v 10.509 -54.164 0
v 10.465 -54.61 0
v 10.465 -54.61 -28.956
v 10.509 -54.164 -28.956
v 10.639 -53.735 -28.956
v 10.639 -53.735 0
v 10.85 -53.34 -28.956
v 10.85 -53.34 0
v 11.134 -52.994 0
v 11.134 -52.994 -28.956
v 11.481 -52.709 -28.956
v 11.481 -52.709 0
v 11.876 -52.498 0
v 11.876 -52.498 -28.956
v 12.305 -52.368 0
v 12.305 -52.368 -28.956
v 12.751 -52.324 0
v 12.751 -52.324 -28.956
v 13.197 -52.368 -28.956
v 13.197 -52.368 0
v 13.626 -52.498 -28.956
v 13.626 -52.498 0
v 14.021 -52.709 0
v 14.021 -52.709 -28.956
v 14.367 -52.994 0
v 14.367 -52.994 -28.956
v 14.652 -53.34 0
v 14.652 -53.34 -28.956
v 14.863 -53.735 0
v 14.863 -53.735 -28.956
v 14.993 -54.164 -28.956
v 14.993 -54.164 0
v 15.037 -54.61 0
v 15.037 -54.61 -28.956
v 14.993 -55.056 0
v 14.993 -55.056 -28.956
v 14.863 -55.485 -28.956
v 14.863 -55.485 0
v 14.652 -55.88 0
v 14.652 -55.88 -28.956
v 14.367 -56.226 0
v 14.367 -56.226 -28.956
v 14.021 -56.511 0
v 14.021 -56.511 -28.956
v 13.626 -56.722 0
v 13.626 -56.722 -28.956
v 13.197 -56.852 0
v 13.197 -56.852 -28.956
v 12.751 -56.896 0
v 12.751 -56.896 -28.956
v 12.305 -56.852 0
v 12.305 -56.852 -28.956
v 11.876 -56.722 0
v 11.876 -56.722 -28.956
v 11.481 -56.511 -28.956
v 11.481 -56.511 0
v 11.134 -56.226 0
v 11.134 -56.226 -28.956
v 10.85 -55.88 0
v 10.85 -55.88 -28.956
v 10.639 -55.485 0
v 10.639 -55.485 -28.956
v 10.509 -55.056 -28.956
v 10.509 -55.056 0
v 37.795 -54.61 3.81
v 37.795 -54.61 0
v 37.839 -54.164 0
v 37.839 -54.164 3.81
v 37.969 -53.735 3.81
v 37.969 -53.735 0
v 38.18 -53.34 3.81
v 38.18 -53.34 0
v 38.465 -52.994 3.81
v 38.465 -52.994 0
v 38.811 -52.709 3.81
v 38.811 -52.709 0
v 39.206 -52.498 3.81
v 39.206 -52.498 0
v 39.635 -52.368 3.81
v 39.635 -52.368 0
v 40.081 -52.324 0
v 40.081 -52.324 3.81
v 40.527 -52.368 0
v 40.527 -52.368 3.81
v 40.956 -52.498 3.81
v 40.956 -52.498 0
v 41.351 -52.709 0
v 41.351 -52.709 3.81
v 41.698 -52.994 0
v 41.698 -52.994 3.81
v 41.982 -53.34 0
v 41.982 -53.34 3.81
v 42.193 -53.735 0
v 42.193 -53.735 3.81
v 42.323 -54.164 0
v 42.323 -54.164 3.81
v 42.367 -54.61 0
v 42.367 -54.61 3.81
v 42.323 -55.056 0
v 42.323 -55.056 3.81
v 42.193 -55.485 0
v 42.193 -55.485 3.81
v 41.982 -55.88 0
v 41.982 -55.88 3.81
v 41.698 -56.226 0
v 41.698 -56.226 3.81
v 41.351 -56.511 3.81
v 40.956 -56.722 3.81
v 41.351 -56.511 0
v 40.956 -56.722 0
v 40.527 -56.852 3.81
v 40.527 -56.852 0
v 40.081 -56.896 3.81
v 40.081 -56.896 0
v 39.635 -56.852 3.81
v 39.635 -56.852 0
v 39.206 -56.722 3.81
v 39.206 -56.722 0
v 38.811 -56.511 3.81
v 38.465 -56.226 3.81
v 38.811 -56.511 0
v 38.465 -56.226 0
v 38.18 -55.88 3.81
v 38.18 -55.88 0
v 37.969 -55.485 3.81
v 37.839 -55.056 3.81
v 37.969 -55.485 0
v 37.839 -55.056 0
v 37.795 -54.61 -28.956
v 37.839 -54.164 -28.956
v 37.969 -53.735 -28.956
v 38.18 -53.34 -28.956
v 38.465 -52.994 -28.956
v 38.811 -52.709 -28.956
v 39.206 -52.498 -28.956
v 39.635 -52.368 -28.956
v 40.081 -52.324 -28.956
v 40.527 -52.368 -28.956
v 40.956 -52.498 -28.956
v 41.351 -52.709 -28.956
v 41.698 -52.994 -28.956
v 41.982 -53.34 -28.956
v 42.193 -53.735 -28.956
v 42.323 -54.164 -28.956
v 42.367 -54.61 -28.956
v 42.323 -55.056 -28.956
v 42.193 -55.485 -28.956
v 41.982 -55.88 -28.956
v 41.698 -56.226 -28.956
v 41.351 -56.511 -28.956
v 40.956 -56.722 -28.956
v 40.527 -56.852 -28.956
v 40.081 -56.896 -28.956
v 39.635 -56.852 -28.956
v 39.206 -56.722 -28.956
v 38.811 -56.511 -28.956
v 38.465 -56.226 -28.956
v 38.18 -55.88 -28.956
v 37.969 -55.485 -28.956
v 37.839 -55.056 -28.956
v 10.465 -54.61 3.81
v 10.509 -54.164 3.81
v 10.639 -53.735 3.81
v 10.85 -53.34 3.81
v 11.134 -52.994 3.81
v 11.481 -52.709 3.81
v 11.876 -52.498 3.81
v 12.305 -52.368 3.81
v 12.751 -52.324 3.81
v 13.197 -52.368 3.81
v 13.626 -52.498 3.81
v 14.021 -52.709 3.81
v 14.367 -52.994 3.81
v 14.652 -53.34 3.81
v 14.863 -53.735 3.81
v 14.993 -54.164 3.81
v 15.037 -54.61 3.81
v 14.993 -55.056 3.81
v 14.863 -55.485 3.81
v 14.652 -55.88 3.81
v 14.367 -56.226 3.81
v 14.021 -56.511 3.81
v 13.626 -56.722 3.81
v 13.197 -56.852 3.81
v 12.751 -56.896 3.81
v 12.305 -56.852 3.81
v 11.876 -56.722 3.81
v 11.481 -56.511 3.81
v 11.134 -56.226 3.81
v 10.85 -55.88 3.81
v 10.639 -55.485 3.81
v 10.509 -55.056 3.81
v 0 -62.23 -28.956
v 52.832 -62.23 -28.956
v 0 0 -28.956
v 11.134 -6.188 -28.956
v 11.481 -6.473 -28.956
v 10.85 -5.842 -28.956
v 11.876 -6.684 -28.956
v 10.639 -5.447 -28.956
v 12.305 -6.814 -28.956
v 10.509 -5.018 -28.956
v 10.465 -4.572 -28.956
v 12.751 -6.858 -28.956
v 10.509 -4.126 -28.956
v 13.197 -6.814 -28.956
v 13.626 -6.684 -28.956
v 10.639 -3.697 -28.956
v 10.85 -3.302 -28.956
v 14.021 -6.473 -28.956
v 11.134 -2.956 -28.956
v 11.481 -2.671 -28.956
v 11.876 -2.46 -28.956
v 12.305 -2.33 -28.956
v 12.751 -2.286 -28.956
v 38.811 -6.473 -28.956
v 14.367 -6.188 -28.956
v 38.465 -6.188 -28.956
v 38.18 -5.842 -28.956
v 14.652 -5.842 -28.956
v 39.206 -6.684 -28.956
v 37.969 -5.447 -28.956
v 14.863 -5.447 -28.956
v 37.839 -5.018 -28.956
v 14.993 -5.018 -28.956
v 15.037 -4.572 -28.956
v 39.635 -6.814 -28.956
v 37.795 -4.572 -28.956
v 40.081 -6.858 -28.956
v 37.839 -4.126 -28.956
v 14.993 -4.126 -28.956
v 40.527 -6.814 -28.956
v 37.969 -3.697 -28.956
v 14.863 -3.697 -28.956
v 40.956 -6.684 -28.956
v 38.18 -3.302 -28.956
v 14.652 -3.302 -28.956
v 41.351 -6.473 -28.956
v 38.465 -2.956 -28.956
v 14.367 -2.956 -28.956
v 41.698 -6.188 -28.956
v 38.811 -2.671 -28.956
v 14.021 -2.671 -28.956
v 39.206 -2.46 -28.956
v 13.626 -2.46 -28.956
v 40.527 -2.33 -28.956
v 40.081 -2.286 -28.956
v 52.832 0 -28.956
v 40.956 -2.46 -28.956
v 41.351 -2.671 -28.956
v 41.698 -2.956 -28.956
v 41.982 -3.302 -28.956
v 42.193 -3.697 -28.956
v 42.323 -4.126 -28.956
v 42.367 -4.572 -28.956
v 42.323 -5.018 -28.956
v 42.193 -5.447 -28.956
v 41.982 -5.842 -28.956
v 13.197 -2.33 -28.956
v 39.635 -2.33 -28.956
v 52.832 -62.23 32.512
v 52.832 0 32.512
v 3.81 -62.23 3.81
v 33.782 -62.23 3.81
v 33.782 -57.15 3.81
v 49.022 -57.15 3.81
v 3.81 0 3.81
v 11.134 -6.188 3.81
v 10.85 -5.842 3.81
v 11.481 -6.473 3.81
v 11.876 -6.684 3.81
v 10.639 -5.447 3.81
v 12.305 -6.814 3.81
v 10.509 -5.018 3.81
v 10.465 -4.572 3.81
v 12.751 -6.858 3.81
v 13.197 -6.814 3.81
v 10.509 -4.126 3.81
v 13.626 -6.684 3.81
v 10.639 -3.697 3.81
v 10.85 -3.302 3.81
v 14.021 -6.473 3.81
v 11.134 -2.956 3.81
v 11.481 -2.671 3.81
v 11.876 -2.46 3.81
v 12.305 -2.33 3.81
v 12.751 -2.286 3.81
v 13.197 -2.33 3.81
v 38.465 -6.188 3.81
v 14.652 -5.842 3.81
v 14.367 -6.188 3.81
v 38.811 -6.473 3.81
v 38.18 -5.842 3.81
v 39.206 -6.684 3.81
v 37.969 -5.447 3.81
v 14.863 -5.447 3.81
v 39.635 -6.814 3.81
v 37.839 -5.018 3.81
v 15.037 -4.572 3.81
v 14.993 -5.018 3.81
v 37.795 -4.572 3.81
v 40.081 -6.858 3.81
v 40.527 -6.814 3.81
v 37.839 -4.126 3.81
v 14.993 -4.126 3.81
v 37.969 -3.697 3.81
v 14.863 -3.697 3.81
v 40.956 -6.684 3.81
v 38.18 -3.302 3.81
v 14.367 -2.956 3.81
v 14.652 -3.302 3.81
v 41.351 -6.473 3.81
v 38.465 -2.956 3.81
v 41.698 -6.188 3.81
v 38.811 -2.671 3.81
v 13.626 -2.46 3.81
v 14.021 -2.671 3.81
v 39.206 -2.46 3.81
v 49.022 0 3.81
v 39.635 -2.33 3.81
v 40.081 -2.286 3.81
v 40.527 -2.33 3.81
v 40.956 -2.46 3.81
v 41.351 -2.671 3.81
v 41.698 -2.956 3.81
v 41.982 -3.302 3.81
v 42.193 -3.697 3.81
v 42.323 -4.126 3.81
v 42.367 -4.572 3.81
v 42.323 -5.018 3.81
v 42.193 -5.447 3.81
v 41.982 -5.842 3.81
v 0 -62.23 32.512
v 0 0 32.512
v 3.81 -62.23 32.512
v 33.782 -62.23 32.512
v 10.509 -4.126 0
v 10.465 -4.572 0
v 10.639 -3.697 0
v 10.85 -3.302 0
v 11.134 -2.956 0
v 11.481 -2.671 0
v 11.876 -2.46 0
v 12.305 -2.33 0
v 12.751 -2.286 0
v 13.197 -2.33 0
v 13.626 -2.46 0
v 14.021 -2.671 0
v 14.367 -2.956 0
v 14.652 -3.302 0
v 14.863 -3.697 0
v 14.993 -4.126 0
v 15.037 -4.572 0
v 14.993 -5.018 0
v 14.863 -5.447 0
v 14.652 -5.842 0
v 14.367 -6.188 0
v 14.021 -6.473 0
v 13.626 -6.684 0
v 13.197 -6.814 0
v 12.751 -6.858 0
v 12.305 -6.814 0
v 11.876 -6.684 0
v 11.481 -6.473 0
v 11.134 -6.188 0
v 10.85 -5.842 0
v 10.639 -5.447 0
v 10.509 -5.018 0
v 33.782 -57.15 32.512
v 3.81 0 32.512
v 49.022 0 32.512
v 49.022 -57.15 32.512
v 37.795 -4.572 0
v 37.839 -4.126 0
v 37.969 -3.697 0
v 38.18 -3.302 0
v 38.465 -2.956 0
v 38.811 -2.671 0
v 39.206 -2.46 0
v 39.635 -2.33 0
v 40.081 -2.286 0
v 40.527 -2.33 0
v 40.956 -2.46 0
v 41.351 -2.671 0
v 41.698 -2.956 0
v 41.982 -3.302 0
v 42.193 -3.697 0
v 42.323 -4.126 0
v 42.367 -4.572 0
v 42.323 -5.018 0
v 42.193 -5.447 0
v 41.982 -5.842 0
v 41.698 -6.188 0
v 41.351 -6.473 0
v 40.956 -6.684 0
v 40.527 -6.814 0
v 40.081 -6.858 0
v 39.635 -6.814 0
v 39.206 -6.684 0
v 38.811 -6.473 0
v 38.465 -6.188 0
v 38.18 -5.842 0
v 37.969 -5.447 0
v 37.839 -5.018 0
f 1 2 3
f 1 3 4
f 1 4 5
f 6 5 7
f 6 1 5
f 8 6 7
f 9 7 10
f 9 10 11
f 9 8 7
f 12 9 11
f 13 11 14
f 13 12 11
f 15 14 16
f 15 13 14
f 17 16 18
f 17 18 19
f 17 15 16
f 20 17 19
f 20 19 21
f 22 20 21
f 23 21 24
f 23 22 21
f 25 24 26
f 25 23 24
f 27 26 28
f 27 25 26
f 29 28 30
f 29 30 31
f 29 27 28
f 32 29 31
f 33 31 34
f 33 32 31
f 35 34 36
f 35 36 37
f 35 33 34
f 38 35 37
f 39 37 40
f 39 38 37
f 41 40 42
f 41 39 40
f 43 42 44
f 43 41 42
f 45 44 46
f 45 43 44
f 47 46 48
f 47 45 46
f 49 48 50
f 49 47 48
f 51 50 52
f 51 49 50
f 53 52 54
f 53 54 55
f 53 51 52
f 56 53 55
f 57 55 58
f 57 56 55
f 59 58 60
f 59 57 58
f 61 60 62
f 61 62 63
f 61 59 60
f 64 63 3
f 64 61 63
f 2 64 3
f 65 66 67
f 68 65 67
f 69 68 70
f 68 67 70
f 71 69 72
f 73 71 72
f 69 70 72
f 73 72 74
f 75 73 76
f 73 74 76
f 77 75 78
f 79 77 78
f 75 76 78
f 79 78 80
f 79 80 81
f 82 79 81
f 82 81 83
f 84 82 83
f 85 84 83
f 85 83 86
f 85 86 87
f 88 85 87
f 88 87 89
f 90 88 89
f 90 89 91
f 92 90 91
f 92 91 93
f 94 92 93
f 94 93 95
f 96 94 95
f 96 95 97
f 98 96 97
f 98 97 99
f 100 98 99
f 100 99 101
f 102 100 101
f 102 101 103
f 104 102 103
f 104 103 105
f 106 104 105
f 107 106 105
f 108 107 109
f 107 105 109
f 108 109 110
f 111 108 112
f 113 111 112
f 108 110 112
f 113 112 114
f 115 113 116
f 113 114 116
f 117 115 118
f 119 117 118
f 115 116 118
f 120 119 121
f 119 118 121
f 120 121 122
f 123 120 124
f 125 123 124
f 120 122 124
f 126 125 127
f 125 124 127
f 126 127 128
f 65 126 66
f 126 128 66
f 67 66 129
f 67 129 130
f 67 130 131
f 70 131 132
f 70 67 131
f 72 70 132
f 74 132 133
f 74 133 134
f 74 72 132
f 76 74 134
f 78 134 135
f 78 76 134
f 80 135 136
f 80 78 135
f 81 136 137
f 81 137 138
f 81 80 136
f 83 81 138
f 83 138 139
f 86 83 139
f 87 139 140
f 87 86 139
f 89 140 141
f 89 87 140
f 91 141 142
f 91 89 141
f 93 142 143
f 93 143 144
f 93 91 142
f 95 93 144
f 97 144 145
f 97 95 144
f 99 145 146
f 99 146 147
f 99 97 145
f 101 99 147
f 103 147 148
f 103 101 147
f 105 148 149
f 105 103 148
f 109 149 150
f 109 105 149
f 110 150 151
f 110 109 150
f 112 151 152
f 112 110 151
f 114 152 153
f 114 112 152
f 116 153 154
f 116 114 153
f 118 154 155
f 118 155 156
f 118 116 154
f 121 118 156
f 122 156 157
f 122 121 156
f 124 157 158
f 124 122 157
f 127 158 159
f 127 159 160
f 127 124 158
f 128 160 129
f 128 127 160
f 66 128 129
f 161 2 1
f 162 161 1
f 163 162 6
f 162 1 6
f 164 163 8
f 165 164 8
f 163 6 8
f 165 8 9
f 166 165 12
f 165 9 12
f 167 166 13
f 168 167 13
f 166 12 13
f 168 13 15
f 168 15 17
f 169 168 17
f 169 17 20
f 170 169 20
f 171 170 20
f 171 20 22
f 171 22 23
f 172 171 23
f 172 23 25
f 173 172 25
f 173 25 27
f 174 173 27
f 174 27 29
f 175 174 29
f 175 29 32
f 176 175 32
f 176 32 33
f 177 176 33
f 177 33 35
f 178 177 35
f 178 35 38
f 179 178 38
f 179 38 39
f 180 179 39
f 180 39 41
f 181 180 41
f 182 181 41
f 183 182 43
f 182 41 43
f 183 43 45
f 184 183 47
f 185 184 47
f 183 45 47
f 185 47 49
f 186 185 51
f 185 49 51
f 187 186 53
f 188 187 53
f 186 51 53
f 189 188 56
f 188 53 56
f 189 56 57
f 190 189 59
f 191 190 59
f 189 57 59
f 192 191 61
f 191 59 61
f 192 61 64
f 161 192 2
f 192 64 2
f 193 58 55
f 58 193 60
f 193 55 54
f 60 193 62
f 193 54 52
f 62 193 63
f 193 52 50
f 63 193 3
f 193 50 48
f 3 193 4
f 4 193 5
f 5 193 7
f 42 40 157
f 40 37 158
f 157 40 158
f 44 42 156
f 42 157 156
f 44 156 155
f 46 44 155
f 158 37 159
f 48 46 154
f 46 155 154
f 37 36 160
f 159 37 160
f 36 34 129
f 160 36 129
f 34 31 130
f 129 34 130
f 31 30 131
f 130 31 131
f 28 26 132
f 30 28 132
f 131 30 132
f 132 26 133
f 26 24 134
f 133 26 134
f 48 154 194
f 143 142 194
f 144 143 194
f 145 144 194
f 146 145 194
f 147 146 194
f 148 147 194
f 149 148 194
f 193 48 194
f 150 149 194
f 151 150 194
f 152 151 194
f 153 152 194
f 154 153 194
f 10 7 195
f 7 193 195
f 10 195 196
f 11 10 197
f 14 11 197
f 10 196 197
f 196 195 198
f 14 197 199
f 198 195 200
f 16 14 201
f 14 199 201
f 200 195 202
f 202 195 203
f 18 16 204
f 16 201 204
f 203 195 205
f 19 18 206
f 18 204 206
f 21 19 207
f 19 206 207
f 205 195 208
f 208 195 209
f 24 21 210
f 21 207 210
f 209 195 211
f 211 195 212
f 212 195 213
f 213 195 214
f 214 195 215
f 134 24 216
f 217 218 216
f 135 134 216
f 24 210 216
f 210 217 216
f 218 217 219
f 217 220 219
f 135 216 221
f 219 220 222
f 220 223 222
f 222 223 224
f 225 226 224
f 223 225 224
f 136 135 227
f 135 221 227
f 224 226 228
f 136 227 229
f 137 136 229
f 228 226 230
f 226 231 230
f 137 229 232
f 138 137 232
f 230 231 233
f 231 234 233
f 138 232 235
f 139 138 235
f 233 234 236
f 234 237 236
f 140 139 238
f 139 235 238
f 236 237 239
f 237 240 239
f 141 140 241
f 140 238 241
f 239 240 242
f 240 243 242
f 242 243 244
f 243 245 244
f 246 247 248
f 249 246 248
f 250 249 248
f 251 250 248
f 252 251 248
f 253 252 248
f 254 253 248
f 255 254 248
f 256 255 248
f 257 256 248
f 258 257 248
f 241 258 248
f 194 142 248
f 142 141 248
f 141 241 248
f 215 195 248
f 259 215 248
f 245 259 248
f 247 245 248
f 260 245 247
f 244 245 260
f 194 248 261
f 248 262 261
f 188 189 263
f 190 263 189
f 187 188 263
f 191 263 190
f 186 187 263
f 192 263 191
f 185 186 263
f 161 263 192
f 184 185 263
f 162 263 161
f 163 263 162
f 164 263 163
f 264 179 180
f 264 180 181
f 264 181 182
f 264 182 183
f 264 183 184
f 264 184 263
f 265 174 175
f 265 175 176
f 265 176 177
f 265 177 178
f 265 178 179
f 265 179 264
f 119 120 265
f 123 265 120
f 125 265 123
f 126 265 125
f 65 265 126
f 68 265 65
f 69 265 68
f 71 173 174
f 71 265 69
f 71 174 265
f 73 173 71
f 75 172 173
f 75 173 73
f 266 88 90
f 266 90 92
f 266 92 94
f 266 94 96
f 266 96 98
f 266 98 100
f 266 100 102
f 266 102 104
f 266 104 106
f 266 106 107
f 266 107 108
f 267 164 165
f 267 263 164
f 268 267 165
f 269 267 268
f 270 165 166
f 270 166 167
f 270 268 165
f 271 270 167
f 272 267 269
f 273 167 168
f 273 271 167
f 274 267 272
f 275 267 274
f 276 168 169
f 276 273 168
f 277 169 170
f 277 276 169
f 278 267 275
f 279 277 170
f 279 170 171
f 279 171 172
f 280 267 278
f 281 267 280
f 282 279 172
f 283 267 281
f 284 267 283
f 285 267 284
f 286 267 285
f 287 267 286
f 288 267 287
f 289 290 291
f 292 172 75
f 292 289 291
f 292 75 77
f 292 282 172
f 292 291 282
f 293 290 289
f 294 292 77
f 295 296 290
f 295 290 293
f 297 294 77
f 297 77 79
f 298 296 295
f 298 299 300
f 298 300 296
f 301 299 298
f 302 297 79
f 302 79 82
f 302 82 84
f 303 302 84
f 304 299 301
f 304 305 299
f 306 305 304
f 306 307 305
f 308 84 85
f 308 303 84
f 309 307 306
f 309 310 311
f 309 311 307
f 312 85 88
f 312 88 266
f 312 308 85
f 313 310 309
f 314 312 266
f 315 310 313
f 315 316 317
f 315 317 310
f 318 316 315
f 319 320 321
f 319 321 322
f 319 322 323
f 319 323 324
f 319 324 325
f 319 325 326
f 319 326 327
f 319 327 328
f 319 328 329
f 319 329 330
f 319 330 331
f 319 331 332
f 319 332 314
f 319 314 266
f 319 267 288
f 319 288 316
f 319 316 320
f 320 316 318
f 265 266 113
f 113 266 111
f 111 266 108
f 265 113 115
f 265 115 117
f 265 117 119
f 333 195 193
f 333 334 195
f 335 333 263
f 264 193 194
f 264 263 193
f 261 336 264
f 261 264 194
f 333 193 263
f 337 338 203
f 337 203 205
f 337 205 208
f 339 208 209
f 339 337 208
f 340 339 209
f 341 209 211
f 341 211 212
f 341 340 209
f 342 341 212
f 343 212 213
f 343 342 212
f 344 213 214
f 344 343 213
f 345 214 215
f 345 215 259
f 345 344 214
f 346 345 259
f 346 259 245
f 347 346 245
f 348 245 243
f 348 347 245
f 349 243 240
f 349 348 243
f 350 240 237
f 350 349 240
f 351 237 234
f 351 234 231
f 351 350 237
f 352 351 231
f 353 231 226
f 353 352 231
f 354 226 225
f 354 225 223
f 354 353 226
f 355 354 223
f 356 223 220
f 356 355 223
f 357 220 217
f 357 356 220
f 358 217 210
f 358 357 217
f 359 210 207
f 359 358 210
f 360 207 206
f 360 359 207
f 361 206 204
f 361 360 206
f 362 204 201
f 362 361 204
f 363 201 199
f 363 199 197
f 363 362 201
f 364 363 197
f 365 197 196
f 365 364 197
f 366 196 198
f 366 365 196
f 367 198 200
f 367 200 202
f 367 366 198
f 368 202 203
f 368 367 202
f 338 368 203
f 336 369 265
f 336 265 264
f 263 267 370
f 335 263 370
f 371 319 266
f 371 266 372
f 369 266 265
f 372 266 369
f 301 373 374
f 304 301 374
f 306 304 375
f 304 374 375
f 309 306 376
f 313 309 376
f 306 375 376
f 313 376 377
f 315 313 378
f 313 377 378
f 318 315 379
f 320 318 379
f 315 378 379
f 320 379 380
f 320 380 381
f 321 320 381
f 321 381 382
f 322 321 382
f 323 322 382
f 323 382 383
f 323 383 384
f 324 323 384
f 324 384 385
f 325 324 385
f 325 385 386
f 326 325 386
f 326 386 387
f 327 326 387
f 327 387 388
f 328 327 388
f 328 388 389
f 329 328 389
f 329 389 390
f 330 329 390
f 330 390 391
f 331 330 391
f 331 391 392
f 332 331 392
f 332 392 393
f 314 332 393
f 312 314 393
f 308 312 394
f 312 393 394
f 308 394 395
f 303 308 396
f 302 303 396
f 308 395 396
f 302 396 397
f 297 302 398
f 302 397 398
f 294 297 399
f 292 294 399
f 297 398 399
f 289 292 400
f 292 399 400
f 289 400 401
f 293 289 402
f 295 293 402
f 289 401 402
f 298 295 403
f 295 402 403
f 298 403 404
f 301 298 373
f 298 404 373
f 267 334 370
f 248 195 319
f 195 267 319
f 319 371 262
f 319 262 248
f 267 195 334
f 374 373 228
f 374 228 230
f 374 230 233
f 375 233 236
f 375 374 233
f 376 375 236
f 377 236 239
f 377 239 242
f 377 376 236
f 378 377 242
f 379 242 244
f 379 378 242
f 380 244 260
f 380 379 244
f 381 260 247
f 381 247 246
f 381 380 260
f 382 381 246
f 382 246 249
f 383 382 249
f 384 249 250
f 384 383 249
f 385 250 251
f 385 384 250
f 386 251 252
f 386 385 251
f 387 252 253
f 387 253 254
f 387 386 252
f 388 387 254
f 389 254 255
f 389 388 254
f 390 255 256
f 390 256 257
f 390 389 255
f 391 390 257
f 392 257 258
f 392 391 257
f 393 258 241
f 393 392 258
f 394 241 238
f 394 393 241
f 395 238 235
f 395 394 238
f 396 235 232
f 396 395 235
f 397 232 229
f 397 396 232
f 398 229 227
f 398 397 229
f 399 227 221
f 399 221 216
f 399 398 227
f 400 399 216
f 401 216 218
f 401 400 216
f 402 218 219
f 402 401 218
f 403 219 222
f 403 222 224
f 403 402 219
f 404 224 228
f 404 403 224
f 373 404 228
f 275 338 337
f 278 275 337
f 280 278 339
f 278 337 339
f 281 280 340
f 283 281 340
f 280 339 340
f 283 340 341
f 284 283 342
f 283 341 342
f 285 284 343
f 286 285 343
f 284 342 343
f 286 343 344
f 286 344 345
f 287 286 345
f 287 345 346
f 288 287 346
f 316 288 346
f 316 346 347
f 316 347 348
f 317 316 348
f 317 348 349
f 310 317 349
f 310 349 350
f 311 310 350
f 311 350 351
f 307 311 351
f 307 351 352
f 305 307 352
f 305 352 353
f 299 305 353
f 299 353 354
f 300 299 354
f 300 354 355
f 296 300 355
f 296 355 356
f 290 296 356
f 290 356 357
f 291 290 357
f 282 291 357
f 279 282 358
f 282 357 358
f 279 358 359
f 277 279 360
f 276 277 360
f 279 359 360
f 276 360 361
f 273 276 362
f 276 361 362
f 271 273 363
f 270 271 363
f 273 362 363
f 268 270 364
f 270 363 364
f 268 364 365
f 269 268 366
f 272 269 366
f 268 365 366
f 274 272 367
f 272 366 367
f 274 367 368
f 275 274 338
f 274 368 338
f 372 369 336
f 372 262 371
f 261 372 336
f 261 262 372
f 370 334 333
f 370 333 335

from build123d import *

# Parameters (mm, degrees)
F0_W     = 52.832
F0_H     = 32.512
F1_DEPTH = 62.23
F2_T     = -3.81
F3_W     = 5.08
F3_H     = 28.702
F4_DEPTH = 15.24
F6_D     = 4.572
F7_DEPTH = 28.956


with BuildPart() as f1:
    # F0 (on Front) → F1 (new body)
    with BuildSketch(Plane.XZ):
        with Locations((26.416, 16.256)):
            Rectangle(F0_W, F0_H)
    extrude(amount=F1_DEPTH)

    # F2
    f2_openings = [f1.faces().sort_by_distance(p)[0] for p in [
        (26.416, 0, 16.256),
        (26.416, -31.115, 32.512),
        (26.416, -62.23, 16.256),
    ]]
    offset(amount=F2_T, openings=f2_openings)

    # F3 (on face) → F4 (join)
    with BuildSketch(Plane(origin=(49.022, 0, 0), x_dir=(0, -1, 0), z_dir=(-1, 0, 0))):
        with Locations((59.69, 18.161)):
            Rectangle(F3_W, F3_H)
    extrude(amount=F4_DEPTH)

    # F6 (through all)
    with Locations(Plane.XY.offset(3.81)):
        with Locations((12.7508, -4.572), (40.0812, -54.61), (12.7508, -54.61), (40.0812, -4.572)):
            Hole(F6_D / 2)

    # F7 (add): a face of the model
    f7_faces = [f1.faces().sort_by_distance(p)[0] for p in [
        (26.416, -31.1460608146, 0),
    ]]
    extrude(f7_faces, amount=F7_DEPTH)


solid = f1.part
